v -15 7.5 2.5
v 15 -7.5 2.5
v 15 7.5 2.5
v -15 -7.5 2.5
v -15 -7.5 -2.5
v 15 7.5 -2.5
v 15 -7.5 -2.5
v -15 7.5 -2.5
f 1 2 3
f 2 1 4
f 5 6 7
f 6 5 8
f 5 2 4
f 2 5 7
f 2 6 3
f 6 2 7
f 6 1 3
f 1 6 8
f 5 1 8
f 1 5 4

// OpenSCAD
// Resize example
resize([30, 15, 5])
    cube([10, 5, 2], center = true);
